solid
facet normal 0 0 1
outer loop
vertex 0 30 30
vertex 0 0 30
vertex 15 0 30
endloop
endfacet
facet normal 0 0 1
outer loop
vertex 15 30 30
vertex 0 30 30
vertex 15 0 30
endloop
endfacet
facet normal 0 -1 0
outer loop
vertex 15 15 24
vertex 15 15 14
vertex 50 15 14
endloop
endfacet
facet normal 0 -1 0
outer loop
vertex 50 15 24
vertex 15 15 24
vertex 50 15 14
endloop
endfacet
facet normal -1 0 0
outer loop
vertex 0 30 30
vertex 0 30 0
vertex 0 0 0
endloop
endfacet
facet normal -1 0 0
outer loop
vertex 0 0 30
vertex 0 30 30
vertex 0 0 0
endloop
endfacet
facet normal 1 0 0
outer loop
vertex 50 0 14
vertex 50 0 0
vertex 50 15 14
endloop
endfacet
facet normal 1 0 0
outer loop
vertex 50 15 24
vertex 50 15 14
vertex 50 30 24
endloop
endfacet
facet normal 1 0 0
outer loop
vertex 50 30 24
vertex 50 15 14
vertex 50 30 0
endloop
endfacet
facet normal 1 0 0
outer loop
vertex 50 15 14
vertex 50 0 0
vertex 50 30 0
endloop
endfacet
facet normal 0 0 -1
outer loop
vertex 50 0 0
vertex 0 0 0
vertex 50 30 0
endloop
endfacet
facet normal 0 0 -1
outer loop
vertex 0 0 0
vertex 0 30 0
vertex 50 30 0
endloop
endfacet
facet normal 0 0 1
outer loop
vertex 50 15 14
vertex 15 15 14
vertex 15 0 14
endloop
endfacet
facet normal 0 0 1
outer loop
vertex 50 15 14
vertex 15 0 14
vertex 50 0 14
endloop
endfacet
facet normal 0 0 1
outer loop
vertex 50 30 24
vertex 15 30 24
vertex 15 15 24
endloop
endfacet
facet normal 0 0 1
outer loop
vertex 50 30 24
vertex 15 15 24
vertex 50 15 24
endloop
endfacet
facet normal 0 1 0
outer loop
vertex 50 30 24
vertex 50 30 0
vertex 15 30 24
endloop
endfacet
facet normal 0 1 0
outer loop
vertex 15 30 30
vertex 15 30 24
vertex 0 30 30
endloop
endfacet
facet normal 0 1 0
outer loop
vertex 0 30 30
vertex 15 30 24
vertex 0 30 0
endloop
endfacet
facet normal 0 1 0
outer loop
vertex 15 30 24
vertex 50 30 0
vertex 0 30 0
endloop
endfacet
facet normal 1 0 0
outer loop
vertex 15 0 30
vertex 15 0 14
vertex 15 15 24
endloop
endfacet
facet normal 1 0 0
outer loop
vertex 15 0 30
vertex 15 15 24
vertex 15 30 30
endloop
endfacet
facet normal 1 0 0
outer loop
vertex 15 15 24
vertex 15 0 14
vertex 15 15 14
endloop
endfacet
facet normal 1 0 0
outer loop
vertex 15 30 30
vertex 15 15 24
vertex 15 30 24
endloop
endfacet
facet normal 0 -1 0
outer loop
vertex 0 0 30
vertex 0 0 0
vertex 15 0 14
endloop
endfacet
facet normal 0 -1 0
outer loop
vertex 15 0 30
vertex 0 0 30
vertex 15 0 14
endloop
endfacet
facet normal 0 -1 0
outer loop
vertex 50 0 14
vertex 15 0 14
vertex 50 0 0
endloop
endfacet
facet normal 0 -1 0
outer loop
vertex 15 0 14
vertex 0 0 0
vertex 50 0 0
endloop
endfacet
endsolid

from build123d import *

# Parameters (mm, degrees)
F0_W     = 35
F0_H     = 15
F1_DEPTH = 14
F2_DEPTH = 24
F3_DEPTH = 30


with BuildPart() as f1:
    # F0 (on Top) → F1 (new body)
    with BuildSketch(Plane.XY):
        Polygon((0, 30), (0, 0), (15, 0), (15, 15), (15, 30), align=None)
        with Locations((32.5, 7.5)):
            Rectangle(F0_W, F0_H)
        with Locations((32.5, 22.5)):
            Rectangle(F0_W, F0_H)
    extrude(amount=F1_DEPTH)

    # F0 (on Top) → F2 (join)
    with BuildSketch(Plane.XY):
        with Locations((32.5, 22.5)):
            Rectangle(F0_W, F0_H)
    extrude(amount=F2_DEPTH)

    # F0 (on Top) → F3 (join)
    with BuildSketch(Plane.XY):
        Polygon((0, 30), (0, 0), (15, 0), (15, 15), (15, 30), align=None)
    extrude(amount=F3_DEPTH)


solid = f1.part
